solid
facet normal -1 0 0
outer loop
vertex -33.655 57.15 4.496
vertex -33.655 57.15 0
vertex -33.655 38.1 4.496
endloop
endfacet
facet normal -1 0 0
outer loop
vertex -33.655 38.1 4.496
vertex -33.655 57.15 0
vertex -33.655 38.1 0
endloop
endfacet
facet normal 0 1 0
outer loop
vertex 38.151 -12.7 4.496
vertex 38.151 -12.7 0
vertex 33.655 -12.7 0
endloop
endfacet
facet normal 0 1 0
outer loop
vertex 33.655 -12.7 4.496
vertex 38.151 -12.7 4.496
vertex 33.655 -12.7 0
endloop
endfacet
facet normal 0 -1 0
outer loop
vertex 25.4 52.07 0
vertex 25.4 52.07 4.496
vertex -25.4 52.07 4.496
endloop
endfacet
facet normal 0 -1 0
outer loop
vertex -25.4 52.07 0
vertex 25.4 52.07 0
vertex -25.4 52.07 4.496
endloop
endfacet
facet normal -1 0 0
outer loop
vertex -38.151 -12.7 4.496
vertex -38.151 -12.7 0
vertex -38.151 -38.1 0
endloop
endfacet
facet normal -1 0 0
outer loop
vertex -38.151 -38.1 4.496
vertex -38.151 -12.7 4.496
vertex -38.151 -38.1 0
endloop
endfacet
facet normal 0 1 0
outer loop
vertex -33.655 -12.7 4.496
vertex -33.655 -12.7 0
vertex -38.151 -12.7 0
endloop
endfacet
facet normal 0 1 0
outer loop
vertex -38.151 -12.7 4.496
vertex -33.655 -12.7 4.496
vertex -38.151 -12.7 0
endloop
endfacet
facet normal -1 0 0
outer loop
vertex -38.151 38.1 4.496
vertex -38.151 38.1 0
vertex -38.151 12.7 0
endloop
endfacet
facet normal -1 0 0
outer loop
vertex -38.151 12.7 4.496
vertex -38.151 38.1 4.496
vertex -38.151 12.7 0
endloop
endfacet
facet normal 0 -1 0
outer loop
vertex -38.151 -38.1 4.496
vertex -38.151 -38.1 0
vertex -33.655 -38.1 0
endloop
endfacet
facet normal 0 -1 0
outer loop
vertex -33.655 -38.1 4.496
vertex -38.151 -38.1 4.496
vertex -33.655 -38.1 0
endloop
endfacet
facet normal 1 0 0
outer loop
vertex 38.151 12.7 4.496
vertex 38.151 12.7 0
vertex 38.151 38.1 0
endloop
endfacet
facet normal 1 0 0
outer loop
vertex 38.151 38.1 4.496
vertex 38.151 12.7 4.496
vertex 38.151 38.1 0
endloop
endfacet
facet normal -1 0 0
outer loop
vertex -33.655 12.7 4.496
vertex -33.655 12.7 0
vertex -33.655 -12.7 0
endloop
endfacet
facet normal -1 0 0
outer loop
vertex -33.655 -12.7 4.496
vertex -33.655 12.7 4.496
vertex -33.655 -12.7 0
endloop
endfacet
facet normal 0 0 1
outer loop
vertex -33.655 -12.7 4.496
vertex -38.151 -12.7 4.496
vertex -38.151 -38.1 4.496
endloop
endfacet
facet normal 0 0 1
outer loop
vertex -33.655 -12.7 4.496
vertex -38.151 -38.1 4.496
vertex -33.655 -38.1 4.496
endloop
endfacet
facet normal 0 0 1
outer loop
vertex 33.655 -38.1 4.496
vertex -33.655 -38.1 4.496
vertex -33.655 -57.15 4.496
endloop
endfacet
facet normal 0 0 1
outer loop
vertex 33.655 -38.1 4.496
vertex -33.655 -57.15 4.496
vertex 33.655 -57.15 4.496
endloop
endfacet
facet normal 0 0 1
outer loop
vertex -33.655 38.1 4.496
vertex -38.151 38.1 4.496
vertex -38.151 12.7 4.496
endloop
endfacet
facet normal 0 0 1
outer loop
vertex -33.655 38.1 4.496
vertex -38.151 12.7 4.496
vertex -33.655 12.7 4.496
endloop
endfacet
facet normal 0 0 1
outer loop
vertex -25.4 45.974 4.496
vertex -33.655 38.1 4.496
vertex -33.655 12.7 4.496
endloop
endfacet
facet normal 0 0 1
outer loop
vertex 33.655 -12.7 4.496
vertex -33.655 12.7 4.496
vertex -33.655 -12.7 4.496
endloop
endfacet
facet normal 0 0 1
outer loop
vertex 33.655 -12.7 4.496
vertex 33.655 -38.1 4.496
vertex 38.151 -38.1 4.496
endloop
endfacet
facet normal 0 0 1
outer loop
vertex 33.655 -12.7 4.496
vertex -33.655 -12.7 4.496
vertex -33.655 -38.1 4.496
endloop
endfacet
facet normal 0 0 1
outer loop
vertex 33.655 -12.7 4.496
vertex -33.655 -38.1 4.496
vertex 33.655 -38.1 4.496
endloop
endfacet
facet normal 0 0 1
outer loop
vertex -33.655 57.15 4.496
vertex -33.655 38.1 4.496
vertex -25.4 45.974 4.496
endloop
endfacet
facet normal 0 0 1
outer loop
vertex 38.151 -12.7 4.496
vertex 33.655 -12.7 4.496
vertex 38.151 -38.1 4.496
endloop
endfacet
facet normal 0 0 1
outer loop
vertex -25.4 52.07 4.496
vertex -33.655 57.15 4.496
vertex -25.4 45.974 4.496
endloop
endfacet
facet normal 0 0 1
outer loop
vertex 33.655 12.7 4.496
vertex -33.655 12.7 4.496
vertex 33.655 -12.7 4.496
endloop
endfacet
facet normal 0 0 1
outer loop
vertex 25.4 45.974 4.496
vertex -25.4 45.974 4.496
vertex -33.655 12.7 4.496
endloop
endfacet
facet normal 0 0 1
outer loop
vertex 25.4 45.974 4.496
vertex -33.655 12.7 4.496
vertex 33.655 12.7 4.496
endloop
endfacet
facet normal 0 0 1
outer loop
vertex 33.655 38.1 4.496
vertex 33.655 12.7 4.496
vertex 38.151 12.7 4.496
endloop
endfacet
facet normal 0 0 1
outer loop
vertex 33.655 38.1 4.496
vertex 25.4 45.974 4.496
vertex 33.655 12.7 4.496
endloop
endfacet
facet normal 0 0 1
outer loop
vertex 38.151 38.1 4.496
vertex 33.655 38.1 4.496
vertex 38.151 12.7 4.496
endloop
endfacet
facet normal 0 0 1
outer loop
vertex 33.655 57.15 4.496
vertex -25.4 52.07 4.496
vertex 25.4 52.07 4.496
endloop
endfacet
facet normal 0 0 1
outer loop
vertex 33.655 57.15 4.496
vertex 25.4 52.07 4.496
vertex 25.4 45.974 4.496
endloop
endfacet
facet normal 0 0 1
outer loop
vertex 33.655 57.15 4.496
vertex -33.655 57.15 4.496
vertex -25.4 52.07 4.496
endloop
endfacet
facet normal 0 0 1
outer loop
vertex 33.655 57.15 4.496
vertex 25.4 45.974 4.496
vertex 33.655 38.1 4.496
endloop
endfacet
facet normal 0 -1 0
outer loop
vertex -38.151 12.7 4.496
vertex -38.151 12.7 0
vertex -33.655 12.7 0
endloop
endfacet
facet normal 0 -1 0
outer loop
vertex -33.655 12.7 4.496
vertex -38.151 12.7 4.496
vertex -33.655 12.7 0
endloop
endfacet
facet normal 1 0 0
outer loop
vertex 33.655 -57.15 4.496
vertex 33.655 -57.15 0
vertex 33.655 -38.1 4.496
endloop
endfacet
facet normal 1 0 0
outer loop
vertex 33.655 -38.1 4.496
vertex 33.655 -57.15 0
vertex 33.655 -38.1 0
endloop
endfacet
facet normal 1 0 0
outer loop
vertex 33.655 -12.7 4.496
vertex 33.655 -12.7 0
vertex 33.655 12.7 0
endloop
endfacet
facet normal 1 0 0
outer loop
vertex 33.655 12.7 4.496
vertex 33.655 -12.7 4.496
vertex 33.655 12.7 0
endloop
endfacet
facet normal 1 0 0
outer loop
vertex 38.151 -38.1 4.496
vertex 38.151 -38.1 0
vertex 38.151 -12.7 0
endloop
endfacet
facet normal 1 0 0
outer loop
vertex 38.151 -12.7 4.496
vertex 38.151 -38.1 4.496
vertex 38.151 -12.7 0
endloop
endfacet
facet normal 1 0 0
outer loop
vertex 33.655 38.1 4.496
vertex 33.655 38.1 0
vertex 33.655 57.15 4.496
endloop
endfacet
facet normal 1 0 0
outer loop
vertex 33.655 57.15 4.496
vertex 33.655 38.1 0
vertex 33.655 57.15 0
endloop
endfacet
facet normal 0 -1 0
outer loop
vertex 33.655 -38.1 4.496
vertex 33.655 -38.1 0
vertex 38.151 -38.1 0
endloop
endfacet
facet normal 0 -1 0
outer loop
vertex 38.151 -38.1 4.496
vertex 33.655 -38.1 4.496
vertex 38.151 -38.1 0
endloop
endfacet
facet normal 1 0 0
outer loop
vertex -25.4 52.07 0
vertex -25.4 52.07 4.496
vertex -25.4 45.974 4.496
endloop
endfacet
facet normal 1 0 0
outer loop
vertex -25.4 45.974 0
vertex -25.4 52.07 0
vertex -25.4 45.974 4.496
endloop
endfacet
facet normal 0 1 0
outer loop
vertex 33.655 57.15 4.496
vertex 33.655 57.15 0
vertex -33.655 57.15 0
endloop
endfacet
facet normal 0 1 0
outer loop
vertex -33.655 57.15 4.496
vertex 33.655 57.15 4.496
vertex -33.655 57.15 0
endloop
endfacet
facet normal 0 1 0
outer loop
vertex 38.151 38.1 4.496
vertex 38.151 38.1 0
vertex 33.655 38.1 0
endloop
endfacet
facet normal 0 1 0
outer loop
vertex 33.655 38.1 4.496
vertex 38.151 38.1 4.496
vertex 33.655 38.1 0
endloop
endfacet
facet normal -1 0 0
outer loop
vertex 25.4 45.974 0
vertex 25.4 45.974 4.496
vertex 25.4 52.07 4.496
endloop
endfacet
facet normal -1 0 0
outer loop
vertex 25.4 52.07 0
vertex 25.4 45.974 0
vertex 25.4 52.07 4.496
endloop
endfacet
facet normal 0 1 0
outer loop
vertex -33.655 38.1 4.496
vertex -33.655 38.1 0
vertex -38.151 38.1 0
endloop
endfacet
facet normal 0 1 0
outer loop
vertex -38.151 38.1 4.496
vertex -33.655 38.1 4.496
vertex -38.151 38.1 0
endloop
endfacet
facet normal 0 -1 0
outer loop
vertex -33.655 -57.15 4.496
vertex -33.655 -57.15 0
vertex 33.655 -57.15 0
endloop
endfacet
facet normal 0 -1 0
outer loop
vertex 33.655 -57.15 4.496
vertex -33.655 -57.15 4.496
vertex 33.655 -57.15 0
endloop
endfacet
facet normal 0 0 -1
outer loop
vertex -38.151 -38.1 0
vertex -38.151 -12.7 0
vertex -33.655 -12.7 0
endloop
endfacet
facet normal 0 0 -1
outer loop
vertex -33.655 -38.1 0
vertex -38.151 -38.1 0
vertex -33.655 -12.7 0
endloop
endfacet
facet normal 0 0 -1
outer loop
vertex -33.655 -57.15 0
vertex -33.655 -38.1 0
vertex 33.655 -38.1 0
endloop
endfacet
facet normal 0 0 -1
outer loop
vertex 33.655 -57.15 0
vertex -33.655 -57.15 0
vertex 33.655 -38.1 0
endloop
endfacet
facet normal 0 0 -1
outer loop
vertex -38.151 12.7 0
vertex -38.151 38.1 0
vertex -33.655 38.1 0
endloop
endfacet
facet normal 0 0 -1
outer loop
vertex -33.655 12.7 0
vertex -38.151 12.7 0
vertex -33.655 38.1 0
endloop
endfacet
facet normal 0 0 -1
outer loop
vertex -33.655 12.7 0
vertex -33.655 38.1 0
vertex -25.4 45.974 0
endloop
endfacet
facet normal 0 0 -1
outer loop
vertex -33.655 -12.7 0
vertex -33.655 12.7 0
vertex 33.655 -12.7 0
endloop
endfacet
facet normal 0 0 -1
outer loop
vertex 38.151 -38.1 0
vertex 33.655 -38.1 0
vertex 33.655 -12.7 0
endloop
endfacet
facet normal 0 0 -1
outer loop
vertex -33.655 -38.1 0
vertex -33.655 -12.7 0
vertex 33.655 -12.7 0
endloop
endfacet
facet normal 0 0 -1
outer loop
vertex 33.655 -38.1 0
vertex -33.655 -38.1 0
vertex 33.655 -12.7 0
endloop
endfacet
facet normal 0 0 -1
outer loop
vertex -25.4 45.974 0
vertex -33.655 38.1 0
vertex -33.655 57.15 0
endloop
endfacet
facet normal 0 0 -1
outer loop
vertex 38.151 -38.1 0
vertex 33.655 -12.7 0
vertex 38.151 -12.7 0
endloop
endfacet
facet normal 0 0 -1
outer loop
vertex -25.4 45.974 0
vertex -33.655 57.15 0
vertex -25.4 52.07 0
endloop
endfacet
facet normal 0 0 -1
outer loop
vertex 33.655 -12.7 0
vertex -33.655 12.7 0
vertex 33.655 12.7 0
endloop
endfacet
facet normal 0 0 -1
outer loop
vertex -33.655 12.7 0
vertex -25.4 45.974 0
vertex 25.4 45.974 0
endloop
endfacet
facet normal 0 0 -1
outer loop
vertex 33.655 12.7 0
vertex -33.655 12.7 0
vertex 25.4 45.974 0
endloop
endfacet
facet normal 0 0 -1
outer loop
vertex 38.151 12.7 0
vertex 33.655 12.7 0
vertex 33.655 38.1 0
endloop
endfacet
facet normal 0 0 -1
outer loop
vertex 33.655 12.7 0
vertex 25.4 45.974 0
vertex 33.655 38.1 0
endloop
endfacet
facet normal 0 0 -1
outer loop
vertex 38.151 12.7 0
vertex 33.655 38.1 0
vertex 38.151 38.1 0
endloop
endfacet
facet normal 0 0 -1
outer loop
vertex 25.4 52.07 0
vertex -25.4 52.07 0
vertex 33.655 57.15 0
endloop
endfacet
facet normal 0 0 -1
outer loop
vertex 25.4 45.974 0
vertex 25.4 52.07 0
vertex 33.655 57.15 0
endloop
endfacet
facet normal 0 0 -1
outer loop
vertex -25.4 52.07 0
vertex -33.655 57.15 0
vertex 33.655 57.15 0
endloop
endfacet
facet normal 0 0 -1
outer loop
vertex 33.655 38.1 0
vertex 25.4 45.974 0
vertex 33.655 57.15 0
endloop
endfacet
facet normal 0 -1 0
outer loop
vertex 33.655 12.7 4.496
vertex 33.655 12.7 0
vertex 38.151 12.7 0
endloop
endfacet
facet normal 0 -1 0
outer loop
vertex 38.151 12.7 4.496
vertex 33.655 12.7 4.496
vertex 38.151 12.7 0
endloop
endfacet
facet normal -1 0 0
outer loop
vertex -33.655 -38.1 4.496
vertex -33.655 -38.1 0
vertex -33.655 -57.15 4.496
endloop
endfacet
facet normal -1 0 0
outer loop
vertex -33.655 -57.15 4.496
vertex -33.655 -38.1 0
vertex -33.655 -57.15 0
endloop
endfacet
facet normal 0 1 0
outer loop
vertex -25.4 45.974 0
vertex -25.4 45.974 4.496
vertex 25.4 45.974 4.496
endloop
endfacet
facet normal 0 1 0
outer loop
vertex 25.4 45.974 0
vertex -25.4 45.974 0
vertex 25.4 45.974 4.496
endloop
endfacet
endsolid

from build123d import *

# Parameters (mm, degrees)
F1_DEPTH = 4.4958
F3_DEPTH = 4.4968


with BuildPart() as f1:
    # F0 (on Top) → F1 (new body)
    with BuildSketch(Plane.XY):
        Polygon((33.655, 57.15), (-33.655, 57.15), (-33.655, 38.1), (-38.1508, 38.1), (-38.1508, 12.7), (-33.655, 12.7), (-33.655, 0), (-33.655, -12.7), (-38.1508, -12.7), (-38.1508, -38.1), (-33.655, -38.1), (-33.655, -57.15), (33.655, -57.15), (33.655, -38.1), (38.1508, -38.1), (38.1508, -12.7), (33.655, -12.7), (33.655, 0), (33.655, 12.7), (38.1508, 12.7), (38.1508, 38.1), (33.655, 38.1), align=None)
    extrude(amount=F1_DEPTH)

    # F2 (on face) → F3 (cut, through all)
    with BuildSketch(Plane.XY.offset(4.4958)):
        Polygon((25.4, 52.07), (-25.4, 52.07), (-25.4, 45.974), (-9.525, 45.974), (9.525, 45.974), (25.4, 45.974), align=None)
    extrude(amount=-F3_DEPTH, mode=Mode.SUBTRACT)


solid = f1.part
